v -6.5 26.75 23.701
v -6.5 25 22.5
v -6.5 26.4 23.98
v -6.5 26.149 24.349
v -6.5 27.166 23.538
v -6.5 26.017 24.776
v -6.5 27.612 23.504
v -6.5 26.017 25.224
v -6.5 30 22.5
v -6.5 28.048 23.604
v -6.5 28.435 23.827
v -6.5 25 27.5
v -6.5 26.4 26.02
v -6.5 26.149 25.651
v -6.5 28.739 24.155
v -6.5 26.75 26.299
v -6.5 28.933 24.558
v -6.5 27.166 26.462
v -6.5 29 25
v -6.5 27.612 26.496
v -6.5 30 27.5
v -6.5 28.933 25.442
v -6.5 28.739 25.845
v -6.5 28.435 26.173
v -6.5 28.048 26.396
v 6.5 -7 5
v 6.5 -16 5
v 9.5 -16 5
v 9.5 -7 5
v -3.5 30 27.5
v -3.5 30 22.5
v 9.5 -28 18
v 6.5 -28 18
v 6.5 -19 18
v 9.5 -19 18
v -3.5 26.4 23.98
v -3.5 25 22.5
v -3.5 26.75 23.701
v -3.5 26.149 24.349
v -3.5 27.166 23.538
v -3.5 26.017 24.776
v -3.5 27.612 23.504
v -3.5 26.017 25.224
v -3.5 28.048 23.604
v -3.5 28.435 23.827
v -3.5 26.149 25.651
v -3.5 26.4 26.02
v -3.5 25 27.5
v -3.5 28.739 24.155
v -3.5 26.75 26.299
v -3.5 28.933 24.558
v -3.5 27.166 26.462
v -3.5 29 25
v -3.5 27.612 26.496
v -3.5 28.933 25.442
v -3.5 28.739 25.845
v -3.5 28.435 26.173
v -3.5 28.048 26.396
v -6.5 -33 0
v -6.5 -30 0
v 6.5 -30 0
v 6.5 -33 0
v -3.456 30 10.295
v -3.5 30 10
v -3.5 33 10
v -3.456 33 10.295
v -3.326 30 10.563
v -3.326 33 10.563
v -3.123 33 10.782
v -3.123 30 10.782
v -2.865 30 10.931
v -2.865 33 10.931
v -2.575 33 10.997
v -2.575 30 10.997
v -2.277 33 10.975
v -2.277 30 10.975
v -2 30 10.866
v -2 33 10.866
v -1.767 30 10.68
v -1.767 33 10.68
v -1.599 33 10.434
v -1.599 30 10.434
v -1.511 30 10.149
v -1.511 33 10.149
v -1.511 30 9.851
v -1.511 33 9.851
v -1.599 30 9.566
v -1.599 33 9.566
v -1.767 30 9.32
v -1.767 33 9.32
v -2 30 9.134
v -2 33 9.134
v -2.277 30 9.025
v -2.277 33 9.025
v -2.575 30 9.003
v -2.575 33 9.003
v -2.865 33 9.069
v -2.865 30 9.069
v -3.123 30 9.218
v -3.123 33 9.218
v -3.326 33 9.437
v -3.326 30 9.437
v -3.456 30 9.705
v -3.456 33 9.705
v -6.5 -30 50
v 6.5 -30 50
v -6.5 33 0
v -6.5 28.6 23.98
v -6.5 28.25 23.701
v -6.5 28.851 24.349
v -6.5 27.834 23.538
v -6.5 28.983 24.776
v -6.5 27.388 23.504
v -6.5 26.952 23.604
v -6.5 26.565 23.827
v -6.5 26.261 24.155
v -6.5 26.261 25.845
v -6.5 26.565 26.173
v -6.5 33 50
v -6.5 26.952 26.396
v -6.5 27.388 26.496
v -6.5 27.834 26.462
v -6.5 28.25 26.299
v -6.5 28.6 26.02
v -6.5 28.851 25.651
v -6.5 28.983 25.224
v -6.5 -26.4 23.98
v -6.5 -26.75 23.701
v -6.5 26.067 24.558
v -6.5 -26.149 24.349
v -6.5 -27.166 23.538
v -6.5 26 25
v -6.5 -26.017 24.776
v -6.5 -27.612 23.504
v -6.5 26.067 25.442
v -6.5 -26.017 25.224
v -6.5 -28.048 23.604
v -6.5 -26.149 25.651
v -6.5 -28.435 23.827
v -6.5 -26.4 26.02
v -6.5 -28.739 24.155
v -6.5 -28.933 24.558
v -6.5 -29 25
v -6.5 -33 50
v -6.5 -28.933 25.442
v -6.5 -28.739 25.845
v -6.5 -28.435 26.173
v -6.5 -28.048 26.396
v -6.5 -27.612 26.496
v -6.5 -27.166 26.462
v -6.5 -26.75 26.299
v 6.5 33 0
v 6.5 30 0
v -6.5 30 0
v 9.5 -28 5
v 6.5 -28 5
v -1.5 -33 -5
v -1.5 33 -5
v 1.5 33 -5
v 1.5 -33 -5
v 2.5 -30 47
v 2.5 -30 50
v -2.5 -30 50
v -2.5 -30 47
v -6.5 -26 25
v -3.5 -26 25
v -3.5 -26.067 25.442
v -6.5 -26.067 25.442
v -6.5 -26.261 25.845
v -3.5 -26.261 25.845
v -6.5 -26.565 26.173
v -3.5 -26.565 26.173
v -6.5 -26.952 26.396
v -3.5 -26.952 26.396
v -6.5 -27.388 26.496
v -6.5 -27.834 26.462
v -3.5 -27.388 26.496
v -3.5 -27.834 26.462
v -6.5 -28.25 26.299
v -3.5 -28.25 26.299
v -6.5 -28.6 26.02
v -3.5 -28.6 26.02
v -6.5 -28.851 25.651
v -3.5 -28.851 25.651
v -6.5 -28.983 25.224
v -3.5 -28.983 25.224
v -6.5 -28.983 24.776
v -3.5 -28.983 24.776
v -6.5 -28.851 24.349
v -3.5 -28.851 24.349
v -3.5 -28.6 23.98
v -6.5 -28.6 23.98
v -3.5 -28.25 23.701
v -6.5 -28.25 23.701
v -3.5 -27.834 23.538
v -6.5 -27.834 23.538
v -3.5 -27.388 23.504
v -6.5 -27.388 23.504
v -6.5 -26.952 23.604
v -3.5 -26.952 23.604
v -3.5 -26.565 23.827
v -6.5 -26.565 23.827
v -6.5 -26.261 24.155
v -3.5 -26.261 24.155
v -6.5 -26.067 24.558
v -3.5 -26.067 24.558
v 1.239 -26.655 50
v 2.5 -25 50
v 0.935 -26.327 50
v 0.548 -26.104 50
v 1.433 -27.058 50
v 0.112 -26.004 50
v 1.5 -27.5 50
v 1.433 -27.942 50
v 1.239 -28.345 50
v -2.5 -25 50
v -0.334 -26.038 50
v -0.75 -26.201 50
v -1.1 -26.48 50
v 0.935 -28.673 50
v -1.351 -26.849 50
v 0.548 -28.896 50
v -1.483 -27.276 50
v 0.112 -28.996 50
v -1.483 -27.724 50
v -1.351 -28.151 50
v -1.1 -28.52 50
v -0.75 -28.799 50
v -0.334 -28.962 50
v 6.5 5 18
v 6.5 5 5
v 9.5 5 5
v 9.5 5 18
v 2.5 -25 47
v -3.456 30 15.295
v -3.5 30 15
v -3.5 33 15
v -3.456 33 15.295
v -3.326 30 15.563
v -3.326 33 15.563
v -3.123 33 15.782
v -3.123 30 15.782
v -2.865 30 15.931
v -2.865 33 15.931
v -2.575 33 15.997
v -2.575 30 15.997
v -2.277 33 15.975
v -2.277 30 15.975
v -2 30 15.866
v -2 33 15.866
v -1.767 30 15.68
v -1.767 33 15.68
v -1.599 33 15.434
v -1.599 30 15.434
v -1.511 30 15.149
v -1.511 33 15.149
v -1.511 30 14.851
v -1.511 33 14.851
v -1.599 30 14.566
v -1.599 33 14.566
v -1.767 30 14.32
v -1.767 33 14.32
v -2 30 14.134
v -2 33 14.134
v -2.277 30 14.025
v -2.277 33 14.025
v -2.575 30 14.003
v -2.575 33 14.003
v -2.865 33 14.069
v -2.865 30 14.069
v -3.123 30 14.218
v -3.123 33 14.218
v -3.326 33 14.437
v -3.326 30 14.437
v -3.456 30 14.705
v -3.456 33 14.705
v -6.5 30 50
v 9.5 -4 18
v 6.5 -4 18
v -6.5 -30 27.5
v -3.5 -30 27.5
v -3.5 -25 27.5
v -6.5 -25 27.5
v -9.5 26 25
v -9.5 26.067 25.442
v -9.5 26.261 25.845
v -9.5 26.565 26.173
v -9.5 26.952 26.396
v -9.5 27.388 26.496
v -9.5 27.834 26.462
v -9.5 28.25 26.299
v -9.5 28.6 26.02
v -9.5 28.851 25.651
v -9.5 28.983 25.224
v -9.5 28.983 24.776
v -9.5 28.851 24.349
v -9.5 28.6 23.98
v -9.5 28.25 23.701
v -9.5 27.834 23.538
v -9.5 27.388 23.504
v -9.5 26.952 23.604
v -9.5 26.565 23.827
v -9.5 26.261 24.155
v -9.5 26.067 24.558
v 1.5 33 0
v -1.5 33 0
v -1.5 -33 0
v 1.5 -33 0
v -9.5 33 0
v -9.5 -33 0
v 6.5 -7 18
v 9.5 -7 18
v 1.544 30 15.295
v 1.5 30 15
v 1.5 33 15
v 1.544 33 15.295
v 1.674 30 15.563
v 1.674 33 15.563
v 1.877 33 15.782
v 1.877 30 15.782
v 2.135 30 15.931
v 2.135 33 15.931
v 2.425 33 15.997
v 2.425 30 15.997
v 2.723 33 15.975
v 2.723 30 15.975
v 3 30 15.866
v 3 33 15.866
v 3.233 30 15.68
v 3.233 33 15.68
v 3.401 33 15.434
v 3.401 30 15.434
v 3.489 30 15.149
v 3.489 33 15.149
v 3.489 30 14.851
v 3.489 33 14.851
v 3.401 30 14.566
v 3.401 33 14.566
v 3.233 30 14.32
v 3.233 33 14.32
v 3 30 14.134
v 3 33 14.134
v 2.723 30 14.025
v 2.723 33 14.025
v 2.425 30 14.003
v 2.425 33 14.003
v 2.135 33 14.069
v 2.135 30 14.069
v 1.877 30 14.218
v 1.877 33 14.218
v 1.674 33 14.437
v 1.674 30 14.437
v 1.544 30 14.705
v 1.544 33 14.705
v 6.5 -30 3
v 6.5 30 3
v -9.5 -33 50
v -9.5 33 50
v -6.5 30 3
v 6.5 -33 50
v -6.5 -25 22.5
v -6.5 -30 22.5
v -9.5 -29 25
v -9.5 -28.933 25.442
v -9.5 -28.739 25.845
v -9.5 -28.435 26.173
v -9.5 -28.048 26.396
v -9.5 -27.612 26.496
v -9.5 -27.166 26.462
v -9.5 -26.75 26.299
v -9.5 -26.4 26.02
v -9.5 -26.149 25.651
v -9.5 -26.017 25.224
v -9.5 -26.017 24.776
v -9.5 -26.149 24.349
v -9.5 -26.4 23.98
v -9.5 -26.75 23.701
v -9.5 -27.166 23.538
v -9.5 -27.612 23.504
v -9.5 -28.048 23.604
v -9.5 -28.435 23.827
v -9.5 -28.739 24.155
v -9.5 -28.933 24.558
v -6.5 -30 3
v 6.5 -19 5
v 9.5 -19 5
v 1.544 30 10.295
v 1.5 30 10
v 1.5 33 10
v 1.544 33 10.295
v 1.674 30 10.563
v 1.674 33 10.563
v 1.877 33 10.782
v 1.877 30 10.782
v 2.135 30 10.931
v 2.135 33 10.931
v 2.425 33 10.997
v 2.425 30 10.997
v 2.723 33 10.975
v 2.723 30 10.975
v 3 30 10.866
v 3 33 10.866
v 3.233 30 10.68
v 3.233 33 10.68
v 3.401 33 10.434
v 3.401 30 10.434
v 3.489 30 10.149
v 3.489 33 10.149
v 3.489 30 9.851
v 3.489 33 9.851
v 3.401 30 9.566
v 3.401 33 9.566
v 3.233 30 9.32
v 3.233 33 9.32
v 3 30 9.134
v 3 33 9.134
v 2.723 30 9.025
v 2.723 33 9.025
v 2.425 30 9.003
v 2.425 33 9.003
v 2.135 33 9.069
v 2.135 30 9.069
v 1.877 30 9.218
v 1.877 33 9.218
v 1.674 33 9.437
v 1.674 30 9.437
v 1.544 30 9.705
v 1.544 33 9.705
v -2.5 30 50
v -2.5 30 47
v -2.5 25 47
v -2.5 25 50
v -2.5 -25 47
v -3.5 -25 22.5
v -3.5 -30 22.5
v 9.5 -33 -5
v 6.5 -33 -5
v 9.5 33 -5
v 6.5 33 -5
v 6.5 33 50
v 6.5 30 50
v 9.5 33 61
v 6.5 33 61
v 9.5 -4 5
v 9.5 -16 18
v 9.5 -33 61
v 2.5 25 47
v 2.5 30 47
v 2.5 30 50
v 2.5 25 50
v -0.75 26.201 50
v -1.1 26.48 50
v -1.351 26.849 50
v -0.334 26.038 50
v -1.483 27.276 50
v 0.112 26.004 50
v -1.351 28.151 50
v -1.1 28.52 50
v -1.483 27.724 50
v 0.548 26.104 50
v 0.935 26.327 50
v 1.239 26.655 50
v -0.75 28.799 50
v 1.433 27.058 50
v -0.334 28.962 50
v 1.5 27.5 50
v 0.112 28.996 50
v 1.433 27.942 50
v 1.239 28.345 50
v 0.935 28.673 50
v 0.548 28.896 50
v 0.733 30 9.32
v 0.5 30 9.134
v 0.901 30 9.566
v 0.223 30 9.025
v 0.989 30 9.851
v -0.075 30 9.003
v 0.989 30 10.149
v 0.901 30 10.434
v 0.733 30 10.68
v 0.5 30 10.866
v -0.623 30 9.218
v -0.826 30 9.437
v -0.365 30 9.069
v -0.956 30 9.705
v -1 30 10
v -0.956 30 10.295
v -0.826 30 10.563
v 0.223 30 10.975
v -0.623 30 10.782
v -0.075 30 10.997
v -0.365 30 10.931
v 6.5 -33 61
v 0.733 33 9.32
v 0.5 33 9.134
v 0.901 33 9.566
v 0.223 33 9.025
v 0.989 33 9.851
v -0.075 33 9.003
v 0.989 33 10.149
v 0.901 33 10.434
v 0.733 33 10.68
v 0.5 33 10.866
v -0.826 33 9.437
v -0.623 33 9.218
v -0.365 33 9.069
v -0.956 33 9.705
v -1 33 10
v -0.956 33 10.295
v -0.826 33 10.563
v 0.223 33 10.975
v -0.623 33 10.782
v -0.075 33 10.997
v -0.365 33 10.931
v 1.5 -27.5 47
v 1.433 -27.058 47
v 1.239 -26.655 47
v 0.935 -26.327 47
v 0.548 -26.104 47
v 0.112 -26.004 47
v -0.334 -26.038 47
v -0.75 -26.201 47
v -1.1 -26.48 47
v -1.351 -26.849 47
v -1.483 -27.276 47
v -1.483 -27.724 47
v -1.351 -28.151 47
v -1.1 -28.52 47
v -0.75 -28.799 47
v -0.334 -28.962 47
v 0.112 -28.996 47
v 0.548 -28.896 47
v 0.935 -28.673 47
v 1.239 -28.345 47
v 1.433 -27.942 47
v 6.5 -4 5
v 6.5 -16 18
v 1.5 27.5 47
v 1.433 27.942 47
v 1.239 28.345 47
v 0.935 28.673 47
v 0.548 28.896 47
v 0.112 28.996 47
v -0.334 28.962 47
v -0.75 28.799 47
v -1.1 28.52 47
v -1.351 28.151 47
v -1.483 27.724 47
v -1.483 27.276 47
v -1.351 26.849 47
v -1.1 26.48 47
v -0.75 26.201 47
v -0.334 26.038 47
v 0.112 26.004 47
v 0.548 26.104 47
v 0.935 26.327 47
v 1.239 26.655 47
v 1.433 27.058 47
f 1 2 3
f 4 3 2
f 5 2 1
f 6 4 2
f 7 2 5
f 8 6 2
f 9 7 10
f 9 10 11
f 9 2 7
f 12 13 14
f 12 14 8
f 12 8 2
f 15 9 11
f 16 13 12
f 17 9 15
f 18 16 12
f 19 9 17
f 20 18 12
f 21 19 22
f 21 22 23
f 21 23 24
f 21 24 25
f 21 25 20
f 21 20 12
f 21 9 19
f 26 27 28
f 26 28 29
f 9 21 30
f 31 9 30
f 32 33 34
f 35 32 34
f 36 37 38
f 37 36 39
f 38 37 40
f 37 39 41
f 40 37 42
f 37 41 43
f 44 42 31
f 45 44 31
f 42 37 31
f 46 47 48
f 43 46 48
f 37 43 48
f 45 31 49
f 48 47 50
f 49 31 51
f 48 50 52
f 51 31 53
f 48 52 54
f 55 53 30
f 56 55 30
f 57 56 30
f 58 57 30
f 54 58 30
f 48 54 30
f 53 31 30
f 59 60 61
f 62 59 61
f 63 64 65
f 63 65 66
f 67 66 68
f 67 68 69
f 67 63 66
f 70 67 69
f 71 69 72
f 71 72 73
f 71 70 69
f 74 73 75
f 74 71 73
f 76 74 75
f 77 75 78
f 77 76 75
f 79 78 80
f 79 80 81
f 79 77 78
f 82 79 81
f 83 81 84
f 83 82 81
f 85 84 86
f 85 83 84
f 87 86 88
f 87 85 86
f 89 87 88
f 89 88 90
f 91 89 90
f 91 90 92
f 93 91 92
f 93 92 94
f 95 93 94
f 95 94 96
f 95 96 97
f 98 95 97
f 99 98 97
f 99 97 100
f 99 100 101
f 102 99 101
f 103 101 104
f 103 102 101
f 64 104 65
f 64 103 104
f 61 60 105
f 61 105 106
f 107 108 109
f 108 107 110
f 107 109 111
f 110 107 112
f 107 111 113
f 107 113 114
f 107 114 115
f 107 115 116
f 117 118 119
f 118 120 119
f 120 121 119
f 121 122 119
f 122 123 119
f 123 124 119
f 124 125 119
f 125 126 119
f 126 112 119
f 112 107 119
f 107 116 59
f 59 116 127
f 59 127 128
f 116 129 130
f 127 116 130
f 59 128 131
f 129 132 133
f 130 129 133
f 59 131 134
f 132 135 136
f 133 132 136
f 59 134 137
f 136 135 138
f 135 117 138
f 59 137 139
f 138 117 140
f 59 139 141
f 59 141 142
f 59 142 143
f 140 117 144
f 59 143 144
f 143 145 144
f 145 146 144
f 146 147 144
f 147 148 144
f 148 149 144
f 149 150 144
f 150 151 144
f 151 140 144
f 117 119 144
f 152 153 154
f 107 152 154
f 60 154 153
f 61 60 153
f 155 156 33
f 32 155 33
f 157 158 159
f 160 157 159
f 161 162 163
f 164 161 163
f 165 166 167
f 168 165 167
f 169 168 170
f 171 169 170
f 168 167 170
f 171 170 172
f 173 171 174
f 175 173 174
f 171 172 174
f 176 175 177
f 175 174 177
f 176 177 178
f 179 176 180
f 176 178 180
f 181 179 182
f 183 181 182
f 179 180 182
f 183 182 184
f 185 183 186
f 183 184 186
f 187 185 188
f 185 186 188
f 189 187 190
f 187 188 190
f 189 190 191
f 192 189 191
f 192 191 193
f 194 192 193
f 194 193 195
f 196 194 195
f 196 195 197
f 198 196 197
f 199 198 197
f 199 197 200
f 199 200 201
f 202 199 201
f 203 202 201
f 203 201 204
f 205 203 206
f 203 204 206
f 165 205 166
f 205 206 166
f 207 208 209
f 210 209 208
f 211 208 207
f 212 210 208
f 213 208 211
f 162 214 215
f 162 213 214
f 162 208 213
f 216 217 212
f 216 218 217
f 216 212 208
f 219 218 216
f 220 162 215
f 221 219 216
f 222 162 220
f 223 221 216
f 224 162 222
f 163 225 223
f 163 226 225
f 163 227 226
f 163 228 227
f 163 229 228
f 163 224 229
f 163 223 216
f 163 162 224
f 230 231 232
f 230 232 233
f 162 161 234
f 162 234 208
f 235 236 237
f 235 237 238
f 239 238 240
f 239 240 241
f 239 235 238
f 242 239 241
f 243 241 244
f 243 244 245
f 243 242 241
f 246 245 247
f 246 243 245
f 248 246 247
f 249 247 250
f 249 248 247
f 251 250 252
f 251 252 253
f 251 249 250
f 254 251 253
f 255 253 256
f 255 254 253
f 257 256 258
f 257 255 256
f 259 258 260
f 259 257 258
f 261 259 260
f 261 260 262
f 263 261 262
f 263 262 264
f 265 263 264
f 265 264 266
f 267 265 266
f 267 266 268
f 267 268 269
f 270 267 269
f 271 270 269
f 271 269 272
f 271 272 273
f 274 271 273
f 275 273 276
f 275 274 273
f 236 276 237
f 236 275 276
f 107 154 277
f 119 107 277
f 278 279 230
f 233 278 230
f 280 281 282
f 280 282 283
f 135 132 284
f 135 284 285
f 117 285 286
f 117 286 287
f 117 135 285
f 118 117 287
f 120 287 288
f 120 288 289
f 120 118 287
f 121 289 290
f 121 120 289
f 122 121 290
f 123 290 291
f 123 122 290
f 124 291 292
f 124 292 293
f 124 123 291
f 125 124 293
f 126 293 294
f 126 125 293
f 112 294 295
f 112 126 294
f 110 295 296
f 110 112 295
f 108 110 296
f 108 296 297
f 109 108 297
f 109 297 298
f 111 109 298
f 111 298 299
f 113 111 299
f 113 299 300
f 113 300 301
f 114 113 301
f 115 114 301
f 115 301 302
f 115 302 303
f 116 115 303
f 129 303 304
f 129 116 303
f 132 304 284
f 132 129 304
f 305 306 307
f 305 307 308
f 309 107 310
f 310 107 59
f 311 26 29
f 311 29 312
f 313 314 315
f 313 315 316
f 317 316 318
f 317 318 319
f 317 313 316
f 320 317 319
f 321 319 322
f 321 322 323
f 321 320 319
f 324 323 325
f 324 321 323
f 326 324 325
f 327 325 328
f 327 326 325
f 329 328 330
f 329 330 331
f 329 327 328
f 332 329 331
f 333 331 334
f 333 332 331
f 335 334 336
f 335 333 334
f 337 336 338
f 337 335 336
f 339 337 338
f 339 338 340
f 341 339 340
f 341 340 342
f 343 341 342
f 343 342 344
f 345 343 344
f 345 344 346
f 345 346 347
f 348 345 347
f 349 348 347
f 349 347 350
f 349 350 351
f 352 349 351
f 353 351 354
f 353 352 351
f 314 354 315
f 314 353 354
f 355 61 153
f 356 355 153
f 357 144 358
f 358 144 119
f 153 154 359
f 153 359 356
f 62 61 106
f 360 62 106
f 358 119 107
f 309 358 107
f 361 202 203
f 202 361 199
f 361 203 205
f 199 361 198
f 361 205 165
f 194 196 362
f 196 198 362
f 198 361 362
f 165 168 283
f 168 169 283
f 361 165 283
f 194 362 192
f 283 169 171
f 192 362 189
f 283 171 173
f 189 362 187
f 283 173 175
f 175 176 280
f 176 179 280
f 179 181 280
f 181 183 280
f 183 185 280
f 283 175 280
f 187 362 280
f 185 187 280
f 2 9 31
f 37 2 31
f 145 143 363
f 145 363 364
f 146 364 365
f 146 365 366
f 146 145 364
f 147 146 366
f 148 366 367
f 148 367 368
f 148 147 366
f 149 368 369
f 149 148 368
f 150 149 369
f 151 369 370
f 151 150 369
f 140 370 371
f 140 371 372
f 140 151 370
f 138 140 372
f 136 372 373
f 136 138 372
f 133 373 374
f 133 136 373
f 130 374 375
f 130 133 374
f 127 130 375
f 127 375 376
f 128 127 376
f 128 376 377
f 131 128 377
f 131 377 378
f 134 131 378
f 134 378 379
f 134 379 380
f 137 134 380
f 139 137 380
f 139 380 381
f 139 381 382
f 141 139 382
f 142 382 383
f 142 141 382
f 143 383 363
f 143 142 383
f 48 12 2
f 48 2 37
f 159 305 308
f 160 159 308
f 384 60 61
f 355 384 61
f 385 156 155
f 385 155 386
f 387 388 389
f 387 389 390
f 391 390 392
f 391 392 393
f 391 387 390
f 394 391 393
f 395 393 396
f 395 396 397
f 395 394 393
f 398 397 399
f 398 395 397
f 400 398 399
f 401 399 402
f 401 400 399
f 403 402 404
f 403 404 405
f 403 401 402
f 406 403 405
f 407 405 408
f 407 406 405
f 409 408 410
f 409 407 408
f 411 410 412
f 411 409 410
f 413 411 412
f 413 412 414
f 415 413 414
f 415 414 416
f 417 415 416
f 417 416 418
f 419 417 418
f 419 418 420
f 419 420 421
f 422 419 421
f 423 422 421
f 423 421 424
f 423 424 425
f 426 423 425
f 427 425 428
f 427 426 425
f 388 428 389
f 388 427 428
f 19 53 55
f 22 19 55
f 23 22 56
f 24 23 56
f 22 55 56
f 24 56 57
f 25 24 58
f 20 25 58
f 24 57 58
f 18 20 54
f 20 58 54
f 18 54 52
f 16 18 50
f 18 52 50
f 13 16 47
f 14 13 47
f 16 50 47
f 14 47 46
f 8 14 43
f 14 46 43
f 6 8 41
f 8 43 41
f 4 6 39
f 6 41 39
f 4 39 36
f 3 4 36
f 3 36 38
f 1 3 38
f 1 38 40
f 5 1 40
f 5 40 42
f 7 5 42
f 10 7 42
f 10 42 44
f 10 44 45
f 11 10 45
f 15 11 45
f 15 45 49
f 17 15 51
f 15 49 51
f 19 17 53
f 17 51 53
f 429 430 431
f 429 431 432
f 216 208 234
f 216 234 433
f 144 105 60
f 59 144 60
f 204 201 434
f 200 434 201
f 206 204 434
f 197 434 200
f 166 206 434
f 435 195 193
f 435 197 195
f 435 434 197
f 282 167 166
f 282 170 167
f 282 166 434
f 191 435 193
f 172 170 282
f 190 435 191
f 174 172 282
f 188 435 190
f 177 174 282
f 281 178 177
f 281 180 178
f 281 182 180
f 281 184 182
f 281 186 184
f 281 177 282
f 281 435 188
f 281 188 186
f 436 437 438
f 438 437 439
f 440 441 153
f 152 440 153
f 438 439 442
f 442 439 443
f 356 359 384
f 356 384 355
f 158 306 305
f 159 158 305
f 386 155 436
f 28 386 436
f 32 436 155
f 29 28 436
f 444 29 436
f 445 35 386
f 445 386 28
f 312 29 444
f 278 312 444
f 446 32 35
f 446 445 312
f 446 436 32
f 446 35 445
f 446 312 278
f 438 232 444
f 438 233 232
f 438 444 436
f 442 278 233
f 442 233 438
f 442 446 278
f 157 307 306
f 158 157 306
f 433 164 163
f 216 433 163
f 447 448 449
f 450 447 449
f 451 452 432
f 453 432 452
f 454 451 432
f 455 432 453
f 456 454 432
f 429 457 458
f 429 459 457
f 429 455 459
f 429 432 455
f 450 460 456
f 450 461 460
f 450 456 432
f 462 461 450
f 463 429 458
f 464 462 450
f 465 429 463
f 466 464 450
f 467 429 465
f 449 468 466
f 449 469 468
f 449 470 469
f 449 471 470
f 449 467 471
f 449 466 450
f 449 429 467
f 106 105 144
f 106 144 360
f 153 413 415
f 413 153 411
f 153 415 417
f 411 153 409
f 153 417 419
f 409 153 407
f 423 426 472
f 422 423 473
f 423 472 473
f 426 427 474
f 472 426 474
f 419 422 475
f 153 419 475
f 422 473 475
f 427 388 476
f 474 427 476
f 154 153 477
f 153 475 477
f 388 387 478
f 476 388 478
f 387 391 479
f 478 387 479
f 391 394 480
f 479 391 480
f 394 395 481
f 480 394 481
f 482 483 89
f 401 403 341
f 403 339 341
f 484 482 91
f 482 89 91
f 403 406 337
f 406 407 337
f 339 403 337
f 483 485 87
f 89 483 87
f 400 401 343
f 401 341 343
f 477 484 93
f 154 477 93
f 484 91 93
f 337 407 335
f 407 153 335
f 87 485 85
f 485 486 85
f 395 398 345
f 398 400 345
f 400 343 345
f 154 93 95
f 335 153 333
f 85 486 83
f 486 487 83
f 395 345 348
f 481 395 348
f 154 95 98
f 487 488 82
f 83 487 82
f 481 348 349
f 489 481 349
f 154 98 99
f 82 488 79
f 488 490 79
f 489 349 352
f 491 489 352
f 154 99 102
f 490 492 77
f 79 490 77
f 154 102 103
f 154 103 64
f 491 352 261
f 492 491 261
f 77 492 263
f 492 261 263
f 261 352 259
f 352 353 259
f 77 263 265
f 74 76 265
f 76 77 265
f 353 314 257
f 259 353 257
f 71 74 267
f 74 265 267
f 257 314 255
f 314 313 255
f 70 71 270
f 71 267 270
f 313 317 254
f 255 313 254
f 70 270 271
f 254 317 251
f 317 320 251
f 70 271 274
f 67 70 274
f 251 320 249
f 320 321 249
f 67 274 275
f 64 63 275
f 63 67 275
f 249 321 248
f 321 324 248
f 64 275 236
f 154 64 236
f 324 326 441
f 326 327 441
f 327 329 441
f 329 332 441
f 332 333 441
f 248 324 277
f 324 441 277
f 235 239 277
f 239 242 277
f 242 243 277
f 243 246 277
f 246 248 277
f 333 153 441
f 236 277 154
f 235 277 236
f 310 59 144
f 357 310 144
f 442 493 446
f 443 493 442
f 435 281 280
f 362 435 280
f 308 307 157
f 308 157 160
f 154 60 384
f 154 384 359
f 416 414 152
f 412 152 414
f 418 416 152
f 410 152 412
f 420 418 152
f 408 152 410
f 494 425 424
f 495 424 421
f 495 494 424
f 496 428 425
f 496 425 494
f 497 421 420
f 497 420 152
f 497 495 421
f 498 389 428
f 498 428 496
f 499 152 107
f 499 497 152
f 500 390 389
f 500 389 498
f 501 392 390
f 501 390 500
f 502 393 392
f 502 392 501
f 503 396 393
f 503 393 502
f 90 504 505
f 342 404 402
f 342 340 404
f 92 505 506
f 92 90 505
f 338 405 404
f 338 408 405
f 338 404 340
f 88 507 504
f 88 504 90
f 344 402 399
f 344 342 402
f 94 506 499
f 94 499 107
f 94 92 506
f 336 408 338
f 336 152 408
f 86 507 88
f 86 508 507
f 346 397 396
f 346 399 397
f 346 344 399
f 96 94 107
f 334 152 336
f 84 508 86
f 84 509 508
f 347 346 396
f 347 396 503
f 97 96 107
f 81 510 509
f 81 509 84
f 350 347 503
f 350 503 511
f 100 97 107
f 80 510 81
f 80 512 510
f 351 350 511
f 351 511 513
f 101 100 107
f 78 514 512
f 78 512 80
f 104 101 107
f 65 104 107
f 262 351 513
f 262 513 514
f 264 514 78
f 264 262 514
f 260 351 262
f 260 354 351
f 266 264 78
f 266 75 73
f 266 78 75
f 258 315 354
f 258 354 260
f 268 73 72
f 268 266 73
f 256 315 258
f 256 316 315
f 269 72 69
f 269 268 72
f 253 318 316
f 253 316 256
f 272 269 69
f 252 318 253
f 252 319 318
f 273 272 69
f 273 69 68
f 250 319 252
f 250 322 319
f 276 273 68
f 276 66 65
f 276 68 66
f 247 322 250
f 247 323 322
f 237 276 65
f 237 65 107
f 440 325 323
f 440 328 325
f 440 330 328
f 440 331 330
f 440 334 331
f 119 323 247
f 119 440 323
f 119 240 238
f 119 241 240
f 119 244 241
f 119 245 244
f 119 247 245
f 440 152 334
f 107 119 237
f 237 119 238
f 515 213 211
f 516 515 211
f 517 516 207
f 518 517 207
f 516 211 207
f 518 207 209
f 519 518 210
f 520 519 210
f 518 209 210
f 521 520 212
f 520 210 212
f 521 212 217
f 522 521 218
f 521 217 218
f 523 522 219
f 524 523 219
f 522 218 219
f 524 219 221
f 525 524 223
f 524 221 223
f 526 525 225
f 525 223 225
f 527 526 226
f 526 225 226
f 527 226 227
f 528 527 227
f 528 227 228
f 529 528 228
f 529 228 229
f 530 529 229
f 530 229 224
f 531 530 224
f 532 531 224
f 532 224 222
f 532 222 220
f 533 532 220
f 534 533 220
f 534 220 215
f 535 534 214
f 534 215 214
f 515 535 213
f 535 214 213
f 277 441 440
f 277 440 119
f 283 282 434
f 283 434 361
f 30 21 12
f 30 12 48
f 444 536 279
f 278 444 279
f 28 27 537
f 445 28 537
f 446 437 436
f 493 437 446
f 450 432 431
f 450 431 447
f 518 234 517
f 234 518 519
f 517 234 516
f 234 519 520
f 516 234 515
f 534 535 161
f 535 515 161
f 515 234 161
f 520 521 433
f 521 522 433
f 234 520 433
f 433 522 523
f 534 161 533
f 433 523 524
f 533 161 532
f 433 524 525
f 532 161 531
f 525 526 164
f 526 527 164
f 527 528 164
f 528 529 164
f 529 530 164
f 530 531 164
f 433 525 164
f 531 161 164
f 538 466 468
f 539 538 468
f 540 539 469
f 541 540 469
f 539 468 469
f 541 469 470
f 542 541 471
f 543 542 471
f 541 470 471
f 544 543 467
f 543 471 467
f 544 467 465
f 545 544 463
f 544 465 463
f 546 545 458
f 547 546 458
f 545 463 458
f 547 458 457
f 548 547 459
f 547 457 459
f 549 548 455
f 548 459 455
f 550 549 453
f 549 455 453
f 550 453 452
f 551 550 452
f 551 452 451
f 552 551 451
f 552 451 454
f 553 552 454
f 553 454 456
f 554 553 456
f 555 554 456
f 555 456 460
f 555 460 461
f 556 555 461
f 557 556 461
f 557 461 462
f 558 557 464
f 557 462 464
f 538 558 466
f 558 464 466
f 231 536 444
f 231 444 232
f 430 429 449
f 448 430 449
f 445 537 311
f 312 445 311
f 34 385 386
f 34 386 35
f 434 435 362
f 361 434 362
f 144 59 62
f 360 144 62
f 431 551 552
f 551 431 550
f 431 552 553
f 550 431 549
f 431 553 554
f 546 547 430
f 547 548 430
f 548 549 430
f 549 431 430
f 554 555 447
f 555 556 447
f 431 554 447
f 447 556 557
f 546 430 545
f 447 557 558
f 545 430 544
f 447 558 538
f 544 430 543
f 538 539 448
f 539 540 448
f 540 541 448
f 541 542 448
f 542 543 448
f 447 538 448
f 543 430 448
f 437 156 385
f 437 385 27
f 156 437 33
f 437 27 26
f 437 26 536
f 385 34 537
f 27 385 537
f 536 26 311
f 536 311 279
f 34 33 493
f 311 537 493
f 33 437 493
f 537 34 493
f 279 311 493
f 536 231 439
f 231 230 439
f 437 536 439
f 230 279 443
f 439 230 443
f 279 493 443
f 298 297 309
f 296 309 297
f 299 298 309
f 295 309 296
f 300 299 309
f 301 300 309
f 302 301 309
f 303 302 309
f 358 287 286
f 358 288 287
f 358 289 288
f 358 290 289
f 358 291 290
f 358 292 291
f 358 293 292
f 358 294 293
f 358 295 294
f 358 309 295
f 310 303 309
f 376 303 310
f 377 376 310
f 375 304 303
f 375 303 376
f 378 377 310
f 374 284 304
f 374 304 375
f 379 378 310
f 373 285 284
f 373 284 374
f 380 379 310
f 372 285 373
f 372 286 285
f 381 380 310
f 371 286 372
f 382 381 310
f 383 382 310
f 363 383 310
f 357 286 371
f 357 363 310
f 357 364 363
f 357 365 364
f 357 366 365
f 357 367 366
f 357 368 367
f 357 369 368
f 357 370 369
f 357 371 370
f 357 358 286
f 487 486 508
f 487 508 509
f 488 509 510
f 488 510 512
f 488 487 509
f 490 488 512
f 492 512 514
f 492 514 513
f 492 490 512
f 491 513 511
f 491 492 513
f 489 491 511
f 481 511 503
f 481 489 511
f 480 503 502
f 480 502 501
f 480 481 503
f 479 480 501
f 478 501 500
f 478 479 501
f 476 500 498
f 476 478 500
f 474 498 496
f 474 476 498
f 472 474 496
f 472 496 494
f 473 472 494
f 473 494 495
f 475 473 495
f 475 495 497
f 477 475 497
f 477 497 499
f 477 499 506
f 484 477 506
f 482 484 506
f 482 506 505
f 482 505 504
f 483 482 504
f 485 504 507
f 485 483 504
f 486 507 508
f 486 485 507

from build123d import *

# Parameters (mm, degrees)
F0_W      = 13
F0_H      = 60
F1_DEPTH  = 3
F2_W      = 13
F2_H      = 47
F2_R      = 1
F2_H_2    = 3
F3_DEPTH  = 3
F4_W      = 13
F4_H      = 47
F4_H_2    = 3
F5_DEPTH  = 3
F6_W      = 66
F6_H      = 66
F6_W_2    = 9
F6_H_2    = 13
F6_W_3    = 60
F6_H_3    = 3
F7_DEPTH  = 3
F8_R      = 1.5
F8_W      = 60
F8_H      = 3
F9_DEPTH  = 3
F10_W     = 3
F10_H     = 60
F10_H_2   = 3
F11_DEPTH = 5
F12_W     = 5
F12_H     = 3
F13_DEPTH = 5
F12_W_2   = 3
F12_H_2   = 5
F14_R     = 1.5
F15_DEPTH = 3
F16_R     = 1.5
F17_DEPTH = 3
F18_W     = 3
F18_H     = 5
F19_DEPTH = 5
F18_W_2   = 5
F18_H_2   = 3
F20_R     = 1.5
F21_DEPTH = 3
F22_R     = 1.5
F23_DEPTH = 3


with BuildPart() as f1:
    # F0 (on Top) → F1 (new body)
    with BuildSketch(Plane.XY):
        Rectangle(F0_W, F0_H)
    extrude(amount=F1_DEPTH)


with BuildPart() as f3:
    # F2 (on face) → F3 (new body)
    with BuildSketch(Plane(origin=(0, 30, 0), x_dir=(-1, 0, 0), z_dir=(0, 1, 0))):
        with Locations((0, 26.5)):
            Rectangle(F2_W, F2_H)
        with Locations((-2.5, 10)):
            Circle(F2_R, mode=Mode.SUBTRACT)
        with Locations((-2.5, 15)):
            Circle(F2_R, mode=Mode.SUBTRACT)
        with Locations((0, 10)):
            Circle(F2_R, mode=Mode.SUBTRACT)
        with Locations((2.5, 10)):
            Circle(F2_R, mode=Mode.SUBTRACT)
        with Locations((2.5, 15)):
            Circle(F2_R, mode=Mode.SUBTRACT)
        with Locations((0, 1.5)):
            Rectangle(F2_W, F2_H_2)
    extrude(amount=F3_DEPTH)


with BuildPart() as f5:
    # F4 (on face) → F5 (new body)
    with BuildSketch(Plane.XZ.offset(30)):
        with Locations((0, 26.5)):
            Rectangle(F4_W, F4_H)
        with Locations((0, 1.5)):
            Rectangle(F4_W, F4_H_2)
    extrude(amount=F5_DEPTH)


with BuildPart() as f7:
    # F6 (on face) → F7 (new body)
    with BuildSketch(Plane.YZ.offset(6.5)):
        with Locations((0, 28)):
            Rectangle(F6_W, F6_H)
        with Locations((-23.5, 11.5)):
            Rectangle(F6_W_2, F6_H_2, mode=Mode.SUBTRACT)
        with Locations((-11.5, 11.5)):
            Rectangle(F6_W_2, F6_H_2, mode=Mode.SUBTRACT)
        with Locations((0, 1.5)):
            Rectangle(F6_W_3, F6_H_3, mode=Mode.SUBTRACT)
        with Locations((0.5, 11.5)):
            Rectangle(F6_W_2, F6_H_2, mode=Mode.SUBTRACT)
        with Locations((0, 1.5)):
            Rectangle(F6_W_3, F6_H_3)
    extrude(amount=F7_DEPTH)


with BuildPart() as f9:
    # F8 (on face) → F9 (new body)
    with BuildSketch(Plane(origin=(-6.5, 0, 0), x_dir=(0, -1, 0), z_dir=(-1, 0, 0))):
        Polygon((-33, 0), (-30, 0), (-30, 3), (30, 3), (30, 0), (33, 0), (33, 50), (-33, 50), align=None)
        with Locations((-27.5, 25)):
            Circle(F8_R, mode=Mode.SUBTRACT)
        with Locations((27.5, 25)):
            Circle(F8_R, mode=Mode.SUBTRACT)
        with Locations((0, 1.5)):
            Rectangle(F8_W, F8_H)
    extrude(amount=F9_DEPTH)


with BuildPart() as f11:
    # F10 (on face) → F11 (new body)
    with BuildSketch(Plane(origin=(0, 0, 0), x_dir=(1, 0, 0), z_dir=(0, 0, -1))):
        Rectangle(F10_W, F10_H)
        with Locations((0, -31.5)):
            Rectangle(F10_W, F10_H_2)
        with Locations((0, 31.5)):
            Rectangle(F10_W, F10_H_2)
    extrude(amount=F11_DEPTH)


with BuildPart() as f13:
    # F12 (on face) → F13 (new body)
    with BuildSketch(Plane.XZ.offset(-30)):
        with Locations((0, 48.5)):
            Rectangle(F12_W, F12_H)
    extrude(amount=F13_DEPTH)

    # F16 (on face) → F17 (cut)
    with BuildSketch(Plane.XY.offset(50)):
        with Locations((0, 27.5)):
            Circle(F16_R)
    extrude(amount=-F17_DEPTH, mode=Mode.SUBTRACT)


with BuildPart() as f13b:
    # F12 (on face) → F13, piece 2 (new body)
    with BuildSketch(Plane.XZ.offset(-30)):
        with Locations((-5, 25)):
            Rectangle(F12_W_2, F12_H_2)
    extrude(amount=F13_DEPTH)

    # F14 (on face) → F15 (cut)
    with BuildSketch(Plane.YZ.offset(-3.5)):
        with Locations((27.5, 25)):
            Circle(F14_R)
    extrude(amount=-F15_DEPTH, mode=Mode.SUBTRACT)


with BuildPart() as f19:
    # F18 (on face) → F19 (new body)
    with BuildSketch(Plane(origin=(0, -30, 0), x_dir=(-1, 0, 0), z_dir=(0, 1, 0))):
        with Locations((5, 25)):
            Rectangle(F18_W, F18_H)
    extrude(amount=F19_DEPTH)

    # F22 (on face) → F23 (cut)
    with BuildSketch(Plane.YZ.offset(-3.5)):
        with Locations((-27.5, 25)):
            Circle(F22_R)
    extrude(amount=-F23_DEPTH, mode=Mode.SUBTRACT)


with BuildPart() as f19b:
    # F18 (on face) → F19, piece 2 (new body)
    with BuildSketch(Plane(origin=(0, -30, 0), x_dir=(-1, 0, 0), z_dir=(0, 1, 0))):
        with Locations((0, 48.5)):
            Rectangle(F18_W_2, F18_H_2)
    extrude(amount=F19_DEPTH)

    # F20 (on face) → F21 (cut)
    with BuildSketch(Plane.XY.offset(50)):
        with Locations((0, -27.5)):
            Circle(F20_R)
    extrude(amount=-F21_DEPTH, mode=Mode.SUBTRACT)


solid = Compound([f1.part, f3.part, f5.part, f7.part, f9.part, f11.part, f13.part, f13b.part, f19.part, f19b.part])
